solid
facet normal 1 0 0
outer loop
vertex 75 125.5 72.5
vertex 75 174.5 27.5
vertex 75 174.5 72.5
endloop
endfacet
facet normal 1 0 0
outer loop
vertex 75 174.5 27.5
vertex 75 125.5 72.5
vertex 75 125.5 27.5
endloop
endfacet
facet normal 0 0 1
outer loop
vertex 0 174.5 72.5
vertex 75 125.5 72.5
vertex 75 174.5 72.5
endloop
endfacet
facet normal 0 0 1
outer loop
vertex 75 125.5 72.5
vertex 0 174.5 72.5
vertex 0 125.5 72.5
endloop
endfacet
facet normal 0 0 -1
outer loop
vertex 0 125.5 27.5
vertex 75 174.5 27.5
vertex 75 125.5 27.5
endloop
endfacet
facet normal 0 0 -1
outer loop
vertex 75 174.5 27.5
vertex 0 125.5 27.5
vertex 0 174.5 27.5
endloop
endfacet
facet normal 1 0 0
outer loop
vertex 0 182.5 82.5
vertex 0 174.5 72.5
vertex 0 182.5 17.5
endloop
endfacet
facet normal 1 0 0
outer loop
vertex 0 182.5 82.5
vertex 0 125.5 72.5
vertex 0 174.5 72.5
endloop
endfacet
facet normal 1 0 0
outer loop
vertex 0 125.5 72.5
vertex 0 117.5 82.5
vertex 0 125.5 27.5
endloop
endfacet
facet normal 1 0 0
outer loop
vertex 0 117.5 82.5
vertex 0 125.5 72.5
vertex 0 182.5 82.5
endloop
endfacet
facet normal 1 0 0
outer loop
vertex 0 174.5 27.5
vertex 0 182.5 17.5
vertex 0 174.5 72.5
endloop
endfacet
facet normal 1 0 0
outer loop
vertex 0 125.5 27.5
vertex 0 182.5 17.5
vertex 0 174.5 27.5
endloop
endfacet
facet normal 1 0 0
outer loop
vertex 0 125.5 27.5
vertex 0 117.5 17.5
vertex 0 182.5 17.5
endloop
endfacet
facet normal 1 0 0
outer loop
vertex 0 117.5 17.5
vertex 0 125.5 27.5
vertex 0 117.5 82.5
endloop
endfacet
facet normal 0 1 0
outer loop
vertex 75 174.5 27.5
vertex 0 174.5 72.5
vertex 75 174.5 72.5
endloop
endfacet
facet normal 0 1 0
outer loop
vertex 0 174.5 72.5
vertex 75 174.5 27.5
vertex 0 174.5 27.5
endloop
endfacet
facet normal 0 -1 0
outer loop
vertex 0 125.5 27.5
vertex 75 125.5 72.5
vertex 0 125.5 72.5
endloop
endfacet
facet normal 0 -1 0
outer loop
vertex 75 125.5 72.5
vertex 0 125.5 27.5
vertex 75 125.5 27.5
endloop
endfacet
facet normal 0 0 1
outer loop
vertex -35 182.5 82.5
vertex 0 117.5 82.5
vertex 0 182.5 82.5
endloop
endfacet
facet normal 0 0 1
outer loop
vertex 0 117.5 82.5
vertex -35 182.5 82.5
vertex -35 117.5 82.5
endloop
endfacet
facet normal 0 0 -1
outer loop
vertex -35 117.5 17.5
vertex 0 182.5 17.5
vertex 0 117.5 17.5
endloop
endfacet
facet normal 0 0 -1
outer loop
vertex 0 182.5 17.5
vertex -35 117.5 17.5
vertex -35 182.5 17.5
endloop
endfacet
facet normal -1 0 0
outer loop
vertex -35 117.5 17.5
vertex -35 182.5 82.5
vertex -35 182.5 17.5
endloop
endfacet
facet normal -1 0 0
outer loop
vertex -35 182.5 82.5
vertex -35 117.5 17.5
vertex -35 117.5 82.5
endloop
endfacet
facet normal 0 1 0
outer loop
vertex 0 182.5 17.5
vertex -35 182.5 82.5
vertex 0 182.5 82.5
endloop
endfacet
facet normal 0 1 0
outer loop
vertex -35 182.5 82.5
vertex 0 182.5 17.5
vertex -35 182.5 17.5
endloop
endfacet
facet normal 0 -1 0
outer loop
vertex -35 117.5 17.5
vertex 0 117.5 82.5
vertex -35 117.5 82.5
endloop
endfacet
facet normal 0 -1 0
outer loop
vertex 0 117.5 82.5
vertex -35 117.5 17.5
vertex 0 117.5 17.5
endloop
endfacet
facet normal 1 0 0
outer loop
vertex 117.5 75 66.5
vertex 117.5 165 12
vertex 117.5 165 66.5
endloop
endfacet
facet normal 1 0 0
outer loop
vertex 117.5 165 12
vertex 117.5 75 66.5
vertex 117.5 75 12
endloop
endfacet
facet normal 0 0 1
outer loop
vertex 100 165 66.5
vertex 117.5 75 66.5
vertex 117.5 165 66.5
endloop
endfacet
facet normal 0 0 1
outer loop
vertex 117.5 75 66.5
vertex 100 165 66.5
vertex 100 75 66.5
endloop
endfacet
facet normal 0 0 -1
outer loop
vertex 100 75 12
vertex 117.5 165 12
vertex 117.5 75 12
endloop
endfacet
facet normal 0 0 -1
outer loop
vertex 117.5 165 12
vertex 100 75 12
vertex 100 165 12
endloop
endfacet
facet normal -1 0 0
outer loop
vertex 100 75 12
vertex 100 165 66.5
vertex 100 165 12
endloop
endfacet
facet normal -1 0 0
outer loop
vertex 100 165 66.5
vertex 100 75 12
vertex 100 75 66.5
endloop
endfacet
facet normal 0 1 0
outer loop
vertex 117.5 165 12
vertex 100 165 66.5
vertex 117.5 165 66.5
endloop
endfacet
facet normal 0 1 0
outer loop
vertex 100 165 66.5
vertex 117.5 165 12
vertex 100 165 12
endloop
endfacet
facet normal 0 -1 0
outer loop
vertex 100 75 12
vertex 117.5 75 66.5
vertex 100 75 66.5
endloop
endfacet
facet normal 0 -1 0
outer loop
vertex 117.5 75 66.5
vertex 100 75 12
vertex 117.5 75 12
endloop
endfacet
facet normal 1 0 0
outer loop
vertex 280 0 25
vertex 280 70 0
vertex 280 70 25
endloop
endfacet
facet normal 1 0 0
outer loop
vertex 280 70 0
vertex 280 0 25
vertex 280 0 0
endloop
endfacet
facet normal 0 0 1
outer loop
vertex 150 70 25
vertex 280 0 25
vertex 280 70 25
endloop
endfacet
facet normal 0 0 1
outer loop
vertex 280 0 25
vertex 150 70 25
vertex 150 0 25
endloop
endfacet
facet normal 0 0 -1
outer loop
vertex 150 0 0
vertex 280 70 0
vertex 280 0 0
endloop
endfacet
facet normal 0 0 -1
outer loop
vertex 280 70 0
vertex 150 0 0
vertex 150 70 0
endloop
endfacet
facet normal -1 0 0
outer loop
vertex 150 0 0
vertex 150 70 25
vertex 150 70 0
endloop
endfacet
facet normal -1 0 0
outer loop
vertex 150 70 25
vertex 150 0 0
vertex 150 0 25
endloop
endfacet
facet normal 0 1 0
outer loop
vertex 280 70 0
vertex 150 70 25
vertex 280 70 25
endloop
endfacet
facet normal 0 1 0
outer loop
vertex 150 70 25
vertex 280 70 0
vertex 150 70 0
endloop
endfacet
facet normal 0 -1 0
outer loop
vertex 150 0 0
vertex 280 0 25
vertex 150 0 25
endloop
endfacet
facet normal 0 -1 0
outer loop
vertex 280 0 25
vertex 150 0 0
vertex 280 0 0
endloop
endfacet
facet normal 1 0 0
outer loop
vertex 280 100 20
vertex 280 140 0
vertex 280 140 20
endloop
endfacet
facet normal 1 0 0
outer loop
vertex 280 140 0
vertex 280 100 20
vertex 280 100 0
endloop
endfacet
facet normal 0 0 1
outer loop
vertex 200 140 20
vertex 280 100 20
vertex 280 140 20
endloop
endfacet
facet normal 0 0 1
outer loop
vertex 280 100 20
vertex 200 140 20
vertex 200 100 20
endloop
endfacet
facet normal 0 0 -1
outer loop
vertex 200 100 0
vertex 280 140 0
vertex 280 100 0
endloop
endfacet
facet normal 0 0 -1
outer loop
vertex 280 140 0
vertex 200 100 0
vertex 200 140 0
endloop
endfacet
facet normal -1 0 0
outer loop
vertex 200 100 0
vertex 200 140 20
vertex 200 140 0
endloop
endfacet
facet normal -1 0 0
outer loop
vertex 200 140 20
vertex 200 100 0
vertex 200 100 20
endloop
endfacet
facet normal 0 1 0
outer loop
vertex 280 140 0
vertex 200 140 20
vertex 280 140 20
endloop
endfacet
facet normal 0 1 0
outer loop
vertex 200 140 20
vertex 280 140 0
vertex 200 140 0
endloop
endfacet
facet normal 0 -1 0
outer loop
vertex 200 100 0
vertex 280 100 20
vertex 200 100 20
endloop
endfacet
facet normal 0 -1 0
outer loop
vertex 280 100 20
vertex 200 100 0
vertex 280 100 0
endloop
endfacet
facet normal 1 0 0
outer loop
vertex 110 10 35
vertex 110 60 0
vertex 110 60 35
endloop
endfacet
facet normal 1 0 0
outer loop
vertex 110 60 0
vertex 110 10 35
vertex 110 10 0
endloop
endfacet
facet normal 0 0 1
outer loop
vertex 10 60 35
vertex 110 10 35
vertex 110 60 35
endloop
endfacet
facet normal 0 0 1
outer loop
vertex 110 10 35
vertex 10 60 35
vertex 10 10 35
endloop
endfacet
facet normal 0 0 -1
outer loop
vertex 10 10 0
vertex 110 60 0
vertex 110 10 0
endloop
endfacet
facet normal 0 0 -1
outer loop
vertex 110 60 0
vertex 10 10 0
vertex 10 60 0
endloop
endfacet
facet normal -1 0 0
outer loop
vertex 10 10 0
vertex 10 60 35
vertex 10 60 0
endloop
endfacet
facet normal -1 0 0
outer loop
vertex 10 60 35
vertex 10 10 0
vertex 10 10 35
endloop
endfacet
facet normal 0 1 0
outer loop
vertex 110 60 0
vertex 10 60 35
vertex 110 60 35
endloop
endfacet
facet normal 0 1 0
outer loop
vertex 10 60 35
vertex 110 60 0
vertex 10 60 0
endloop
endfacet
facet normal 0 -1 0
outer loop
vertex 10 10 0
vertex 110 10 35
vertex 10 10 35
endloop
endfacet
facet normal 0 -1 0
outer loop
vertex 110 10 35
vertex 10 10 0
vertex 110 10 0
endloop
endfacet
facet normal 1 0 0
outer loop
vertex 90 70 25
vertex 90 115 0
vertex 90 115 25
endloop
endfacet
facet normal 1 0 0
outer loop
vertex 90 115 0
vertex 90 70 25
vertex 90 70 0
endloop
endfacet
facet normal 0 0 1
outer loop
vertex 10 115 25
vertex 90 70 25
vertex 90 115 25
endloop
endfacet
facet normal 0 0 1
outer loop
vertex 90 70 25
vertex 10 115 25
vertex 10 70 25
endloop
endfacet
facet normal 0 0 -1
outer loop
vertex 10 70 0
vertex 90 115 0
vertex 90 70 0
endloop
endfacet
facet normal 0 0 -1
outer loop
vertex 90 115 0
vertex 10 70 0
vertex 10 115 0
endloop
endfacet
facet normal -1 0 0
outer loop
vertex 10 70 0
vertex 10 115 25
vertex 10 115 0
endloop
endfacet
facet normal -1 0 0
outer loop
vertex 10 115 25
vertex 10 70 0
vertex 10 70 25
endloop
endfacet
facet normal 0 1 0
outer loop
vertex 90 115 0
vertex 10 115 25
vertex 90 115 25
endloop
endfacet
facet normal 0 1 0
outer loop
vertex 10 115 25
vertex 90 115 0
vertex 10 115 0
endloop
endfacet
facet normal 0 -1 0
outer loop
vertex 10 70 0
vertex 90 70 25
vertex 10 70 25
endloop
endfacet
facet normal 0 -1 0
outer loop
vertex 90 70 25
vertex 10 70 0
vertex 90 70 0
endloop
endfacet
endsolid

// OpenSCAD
// Box

%cube([300,250,150]);

// Netzteil HDR-15-12
translate([100,75,12])cube([17.5,90,54.5]);

module Hauptschalter()
{
    translate([0,-49/2,-45/2])cube([75,49,45]);
    translate([-35,(49-65)/2-49/2,(45-65)/2-45/2])cube([35,65,65]);
}

translate([0,200/2+50,100/2]) Hauptschalter();

translate([150,0,0]) cube([130,70,25]); // pi
translate([200,100,0]) cube([80,40,20]); // ti
translate([10,10,0]) cube([100,50,35]); // DO/DI
translate([10,70,0]) cube([80,45,25]); // Relay
